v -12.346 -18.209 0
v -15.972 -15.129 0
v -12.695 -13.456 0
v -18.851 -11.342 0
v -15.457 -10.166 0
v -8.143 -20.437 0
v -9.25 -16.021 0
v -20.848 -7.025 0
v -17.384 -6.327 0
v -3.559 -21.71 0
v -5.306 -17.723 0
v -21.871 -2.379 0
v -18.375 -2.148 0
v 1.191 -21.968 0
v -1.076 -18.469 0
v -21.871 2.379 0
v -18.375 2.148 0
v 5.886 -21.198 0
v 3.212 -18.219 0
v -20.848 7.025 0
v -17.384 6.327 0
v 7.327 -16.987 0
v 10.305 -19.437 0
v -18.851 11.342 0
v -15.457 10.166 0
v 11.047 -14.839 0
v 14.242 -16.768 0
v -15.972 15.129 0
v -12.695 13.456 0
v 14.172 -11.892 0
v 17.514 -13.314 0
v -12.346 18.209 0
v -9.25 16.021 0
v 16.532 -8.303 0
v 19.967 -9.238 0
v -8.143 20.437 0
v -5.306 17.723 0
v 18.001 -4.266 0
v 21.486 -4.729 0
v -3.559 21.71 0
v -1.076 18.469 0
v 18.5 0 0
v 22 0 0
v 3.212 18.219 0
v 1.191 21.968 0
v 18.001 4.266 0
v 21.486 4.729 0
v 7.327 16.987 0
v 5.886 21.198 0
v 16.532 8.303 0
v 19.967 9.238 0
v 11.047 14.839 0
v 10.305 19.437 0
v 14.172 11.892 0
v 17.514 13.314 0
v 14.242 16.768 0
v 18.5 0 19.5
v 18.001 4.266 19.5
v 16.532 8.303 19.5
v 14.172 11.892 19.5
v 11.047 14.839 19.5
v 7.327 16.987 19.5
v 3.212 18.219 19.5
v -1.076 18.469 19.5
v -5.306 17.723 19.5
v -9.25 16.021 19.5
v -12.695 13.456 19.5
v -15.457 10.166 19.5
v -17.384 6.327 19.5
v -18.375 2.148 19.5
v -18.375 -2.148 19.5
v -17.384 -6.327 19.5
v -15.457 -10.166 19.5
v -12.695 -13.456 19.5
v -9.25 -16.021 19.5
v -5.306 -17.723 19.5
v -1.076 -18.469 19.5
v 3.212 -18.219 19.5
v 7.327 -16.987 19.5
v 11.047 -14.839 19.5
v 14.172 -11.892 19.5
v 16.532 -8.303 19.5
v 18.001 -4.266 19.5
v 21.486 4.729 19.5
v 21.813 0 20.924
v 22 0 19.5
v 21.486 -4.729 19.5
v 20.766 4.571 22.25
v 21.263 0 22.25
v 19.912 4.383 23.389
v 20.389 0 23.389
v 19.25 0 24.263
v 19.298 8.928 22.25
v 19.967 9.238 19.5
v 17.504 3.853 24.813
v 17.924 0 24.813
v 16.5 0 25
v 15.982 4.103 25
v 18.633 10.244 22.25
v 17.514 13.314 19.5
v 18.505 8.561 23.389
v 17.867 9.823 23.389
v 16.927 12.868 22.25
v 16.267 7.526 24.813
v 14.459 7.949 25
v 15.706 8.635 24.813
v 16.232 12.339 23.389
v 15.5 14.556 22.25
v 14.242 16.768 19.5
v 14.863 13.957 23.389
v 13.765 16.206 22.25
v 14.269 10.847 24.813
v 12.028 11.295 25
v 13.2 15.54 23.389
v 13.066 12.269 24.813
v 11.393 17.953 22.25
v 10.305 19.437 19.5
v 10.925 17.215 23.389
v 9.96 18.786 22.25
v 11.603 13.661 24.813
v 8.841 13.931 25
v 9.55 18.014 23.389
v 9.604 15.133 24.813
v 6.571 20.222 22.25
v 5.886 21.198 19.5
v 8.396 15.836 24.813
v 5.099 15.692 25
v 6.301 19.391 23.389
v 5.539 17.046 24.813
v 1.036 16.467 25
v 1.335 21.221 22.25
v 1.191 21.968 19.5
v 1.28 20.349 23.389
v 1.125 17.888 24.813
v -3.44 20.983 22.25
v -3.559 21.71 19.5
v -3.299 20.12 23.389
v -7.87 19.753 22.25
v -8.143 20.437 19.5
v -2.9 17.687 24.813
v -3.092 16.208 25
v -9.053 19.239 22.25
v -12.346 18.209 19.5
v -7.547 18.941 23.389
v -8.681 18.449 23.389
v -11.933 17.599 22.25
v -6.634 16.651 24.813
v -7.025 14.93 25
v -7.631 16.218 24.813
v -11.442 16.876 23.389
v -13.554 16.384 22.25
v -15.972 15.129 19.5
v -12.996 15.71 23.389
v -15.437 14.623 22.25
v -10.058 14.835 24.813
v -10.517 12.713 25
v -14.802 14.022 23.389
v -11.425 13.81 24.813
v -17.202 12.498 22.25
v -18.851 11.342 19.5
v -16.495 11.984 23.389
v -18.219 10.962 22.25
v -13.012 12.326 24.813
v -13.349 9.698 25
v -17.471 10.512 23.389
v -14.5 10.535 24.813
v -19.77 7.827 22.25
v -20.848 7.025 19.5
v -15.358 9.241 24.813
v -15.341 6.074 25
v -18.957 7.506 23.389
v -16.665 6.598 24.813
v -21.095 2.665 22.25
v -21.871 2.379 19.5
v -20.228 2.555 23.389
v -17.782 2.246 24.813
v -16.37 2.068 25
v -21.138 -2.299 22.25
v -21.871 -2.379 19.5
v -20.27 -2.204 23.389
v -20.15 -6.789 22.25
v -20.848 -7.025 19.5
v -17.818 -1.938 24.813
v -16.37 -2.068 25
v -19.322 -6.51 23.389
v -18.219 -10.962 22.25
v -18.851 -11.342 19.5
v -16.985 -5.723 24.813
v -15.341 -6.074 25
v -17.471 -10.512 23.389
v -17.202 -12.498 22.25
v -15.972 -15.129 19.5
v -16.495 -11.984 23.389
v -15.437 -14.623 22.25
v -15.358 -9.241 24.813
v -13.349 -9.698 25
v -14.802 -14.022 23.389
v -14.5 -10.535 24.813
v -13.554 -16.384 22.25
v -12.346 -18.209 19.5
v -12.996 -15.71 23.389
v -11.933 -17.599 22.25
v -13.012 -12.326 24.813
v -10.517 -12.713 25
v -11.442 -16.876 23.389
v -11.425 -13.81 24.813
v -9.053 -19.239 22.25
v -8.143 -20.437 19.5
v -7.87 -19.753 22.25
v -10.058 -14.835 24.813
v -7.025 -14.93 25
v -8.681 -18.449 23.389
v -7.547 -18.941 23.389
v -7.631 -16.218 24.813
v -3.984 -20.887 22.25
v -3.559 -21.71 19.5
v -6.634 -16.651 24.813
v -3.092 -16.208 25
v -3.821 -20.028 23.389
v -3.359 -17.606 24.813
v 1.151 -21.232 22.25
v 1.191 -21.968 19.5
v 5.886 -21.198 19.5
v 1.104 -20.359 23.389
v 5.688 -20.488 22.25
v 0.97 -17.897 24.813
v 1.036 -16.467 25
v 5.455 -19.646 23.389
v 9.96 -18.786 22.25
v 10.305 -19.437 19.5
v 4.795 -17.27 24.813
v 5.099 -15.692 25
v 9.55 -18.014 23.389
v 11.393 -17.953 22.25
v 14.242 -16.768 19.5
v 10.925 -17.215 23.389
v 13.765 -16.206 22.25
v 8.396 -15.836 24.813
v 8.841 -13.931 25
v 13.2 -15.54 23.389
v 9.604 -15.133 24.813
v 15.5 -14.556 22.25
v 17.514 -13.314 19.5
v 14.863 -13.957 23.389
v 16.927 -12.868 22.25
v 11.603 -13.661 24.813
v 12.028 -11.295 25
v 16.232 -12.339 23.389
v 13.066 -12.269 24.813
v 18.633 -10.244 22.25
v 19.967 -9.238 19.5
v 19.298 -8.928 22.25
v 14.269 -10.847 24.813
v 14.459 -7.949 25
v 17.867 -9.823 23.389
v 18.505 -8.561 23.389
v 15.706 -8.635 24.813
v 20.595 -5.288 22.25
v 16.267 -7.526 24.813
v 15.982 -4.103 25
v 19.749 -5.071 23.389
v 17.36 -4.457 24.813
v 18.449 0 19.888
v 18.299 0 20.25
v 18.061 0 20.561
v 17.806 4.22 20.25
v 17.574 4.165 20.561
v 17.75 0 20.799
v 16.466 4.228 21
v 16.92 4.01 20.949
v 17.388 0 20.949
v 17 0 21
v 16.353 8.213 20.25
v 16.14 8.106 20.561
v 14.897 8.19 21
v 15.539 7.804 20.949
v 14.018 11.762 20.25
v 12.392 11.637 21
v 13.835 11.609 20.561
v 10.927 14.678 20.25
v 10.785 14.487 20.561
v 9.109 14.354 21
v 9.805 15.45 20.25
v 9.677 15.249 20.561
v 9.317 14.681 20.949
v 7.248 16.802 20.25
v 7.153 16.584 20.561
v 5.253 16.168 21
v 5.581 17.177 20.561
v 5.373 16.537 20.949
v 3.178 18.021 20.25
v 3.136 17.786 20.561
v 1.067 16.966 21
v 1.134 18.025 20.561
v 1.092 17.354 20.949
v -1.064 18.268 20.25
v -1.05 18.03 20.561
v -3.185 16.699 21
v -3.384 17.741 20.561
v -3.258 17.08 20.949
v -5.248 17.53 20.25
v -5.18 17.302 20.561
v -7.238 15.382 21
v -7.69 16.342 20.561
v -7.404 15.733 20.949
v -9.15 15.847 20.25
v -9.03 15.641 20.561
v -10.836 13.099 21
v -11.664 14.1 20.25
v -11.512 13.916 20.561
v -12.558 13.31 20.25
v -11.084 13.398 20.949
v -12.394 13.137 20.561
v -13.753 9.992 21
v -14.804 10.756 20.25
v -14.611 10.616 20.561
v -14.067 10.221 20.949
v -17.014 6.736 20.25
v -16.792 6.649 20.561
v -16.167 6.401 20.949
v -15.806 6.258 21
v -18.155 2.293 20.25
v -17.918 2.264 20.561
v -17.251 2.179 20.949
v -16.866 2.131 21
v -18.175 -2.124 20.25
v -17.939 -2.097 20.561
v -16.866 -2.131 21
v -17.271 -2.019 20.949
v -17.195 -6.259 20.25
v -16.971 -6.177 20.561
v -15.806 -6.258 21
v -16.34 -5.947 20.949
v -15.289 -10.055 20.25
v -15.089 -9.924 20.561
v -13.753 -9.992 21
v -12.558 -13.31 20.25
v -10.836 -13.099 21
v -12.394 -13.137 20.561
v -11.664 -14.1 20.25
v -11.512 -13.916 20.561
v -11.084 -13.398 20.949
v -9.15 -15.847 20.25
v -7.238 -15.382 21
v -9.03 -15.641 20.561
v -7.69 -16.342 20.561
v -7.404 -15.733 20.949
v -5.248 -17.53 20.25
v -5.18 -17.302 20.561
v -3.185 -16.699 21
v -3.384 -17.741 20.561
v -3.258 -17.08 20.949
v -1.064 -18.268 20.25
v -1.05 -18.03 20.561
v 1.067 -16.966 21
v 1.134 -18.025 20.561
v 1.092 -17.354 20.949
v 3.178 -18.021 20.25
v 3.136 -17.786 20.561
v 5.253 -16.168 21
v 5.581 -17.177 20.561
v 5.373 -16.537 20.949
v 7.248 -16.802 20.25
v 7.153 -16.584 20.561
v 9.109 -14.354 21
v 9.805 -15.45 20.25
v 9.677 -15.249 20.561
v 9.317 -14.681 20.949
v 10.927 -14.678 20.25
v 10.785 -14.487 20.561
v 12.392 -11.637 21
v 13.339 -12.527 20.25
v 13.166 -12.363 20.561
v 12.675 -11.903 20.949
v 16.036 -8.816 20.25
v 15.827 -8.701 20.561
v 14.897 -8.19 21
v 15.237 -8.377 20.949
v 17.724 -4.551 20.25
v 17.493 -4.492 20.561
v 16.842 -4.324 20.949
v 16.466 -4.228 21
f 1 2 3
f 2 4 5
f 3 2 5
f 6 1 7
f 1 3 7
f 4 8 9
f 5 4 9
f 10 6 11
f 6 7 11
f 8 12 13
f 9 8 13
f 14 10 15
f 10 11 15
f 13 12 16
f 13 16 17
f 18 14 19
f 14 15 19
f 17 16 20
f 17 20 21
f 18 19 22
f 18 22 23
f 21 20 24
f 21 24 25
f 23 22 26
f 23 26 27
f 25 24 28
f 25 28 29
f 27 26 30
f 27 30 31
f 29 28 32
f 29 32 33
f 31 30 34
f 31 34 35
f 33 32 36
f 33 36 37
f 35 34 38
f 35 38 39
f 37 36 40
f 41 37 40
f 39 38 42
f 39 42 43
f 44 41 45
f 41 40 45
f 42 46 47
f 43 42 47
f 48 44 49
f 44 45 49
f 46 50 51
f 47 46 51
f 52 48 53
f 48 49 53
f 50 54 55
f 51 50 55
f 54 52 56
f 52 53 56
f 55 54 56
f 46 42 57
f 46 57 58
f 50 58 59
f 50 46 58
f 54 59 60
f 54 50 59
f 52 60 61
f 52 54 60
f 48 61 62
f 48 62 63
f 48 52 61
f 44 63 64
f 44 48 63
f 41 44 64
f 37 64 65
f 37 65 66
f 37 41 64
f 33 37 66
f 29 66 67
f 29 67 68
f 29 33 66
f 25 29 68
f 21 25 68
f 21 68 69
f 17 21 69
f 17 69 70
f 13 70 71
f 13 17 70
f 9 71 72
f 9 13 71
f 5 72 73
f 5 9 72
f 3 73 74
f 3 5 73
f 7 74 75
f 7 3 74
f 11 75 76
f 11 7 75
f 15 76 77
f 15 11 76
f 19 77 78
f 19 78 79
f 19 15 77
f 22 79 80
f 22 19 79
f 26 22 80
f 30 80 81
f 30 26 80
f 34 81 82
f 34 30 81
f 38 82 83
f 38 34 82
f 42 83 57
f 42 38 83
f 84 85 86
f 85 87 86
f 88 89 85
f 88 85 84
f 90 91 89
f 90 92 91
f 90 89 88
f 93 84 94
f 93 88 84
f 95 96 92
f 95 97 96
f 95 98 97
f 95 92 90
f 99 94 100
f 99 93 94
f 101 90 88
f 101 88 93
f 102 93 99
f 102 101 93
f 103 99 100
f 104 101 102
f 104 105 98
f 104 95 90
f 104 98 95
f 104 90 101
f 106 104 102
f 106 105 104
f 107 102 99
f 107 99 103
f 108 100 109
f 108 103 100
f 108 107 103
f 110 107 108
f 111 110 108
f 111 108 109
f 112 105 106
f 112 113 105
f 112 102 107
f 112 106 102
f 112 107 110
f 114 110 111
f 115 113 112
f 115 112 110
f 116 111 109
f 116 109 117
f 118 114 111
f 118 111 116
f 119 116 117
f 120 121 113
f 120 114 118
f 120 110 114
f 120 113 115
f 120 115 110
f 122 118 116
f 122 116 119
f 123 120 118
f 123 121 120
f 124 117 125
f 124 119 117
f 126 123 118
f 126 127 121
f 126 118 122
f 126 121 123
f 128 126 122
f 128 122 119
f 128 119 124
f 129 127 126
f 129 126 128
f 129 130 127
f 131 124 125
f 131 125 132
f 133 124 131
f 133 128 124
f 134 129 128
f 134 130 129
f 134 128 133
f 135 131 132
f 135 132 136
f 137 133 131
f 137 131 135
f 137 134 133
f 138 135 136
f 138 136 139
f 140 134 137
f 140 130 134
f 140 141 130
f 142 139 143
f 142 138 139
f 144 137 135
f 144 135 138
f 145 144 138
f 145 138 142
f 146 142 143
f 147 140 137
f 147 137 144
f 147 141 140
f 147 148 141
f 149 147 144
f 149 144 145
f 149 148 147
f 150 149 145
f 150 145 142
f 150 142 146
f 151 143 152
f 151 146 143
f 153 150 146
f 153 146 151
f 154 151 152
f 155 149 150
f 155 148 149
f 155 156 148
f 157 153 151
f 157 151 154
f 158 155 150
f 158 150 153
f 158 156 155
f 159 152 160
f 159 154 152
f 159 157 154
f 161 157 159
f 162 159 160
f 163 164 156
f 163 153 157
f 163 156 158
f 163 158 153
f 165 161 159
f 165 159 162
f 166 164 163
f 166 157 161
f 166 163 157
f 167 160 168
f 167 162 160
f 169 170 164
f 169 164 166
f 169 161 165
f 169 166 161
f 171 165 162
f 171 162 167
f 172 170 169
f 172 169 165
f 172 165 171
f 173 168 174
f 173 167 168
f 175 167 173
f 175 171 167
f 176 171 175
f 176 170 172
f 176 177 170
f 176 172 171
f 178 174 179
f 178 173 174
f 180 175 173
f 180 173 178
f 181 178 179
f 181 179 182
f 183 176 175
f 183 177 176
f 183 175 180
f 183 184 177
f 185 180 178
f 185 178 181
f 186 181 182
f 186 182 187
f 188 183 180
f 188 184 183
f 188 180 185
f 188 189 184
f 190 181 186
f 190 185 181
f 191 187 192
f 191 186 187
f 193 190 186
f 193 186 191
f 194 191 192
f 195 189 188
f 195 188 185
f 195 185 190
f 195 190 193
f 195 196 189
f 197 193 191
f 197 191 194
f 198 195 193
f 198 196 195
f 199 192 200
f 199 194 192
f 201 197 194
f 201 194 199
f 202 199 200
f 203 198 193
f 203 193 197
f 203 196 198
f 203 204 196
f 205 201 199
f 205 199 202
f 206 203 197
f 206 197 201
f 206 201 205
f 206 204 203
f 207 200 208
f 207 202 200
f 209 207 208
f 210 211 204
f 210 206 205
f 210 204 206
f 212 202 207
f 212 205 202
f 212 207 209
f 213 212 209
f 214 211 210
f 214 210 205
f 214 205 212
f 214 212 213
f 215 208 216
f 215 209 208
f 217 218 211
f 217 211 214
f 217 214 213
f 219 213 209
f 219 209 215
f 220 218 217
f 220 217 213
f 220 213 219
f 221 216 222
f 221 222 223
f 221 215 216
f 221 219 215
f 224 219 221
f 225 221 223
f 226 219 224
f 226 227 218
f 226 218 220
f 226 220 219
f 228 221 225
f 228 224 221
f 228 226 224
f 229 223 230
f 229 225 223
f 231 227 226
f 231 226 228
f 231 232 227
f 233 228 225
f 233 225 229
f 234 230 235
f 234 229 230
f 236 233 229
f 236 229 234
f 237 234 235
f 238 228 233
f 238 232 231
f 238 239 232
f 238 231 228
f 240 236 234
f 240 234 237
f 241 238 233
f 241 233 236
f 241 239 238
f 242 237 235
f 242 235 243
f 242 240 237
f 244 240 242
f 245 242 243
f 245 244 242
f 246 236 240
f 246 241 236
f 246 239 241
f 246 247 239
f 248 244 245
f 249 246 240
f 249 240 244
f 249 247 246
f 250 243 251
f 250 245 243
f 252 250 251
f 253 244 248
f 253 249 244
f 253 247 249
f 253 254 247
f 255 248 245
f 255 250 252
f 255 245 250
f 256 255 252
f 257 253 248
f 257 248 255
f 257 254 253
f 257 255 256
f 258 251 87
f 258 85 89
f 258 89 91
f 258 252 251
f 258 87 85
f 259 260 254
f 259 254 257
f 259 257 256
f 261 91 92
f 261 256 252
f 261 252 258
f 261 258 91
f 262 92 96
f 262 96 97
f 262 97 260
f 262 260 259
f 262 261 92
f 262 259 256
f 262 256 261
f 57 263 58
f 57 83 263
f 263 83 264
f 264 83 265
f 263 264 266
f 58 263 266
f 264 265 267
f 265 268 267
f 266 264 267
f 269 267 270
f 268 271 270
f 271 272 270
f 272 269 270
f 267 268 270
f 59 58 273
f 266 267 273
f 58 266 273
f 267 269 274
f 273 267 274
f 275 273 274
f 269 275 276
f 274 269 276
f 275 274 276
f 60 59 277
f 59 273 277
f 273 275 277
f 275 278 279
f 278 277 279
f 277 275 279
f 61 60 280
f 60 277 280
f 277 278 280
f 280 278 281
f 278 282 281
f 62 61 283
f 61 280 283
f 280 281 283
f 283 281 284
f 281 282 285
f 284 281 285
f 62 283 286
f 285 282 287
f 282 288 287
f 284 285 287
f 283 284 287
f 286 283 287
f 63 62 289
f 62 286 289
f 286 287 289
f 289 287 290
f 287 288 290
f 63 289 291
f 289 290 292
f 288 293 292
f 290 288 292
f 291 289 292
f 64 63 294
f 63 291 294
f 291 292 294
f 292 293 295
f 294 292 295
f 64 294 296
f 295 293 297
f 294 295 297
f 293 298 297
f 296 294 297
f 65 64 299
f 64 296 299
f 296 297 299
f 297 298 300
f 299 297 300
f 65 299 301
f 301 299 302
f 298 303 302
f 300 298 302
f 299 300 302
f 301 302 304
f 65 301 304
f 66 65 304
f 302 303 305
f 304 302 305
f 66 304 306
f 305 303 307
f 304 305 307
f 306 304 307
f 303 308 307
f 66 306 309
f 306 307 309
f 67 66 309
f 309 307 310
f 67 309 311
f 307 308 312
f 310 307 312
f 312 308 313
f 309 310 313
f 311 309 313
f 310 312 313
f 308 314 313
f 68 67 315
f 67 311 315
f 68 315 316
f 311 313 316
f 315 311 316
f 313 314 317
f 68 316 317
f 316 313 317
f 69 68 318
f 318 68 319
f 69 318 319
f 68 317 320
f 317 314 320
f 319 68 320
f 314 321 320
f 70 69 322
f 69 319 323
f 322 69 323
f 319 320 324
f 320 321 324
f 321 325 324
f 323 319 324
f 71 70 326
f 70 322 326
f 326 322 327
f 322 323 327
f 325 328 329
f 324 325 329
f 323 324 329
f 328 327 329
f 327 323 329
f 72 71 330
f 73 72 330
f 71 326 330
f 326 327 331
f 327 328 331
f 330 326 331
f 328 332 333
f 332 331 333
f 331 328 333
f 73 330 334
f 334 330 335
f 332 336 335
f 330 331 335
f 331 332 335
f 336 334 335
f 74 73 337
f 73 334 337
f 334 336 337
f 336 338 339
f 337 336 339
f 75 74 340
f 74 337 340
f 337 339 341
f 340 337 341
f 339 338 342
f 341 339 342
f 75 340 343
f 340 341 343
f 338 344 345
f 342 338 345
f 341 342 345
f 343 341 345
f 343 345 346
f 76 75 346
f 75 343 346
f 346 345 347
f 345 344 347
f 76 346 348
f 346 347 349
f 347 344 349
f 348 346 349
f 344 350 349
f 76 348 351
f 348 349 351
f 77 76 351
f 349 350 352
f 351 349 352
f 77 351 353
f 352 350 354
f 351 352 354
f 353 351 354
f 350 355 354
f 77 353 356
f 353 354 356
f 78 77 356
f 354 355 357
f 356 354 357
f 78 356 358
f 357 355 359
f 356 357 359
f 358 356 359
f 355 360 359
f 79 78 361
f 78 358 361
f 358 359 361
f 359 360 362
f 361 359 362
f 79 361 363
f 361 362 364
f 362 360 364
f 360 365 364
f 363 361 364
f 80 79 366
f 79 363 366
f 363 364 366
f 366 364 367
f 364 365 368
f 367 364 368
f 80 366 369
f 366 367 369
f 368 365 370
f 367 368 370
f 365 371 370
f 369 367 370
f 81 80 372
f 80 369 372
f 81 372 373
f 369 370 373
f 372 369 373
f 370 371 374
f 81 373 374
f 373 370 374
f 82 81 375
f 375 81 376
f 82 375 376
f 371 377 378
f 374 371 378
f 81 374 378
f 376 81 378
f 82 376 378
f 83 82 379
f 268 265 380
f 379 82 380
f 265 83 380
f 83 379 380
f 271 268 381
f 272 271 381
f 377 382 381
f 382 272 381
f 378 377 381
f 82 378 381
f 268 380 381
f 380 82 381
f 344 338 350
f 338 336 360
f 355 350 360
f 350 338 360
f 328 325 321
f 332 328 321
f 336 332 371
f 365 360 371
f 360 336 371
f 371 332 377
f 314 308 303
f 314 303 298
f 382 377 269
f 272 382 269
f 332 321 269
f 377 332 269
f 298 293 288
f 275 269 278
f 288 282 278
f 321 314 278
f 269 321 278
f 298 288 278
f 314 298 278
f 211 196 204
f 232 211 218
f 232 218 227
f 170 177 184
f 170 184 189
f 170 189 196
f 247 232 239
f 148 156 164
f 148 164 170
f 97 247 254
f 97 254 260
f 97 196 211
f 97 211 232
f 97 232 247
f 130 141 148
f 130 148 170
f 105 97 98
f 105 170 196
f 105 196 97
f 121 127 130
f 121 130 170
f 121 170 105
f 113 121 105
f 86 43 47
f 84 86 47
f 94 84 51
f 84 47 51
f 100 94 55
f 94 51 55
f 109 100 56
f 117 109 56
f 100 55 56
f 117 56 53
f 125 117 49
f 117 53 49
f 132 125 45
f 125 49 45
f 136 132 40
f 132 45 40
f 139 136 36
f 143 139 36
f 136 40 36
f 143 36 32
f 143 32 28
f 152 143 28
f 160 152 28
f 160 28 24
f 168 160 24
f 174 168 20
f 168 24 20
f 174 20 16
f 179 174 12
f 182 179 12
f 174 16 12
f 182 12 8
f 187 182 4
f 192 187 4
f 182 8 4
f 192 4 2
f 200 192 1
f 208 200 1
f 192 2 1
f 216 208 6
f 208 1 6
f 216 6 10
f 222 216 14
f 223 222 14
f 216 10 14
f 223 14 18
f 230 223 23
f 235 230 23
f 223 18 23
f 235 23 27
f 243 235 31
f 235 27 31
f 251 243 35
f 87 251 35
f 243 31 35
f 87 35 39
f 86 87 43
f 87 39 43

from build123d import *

# Parameters (mm, degrees)
F0_R     = 22
F1_DEPTH = 25
F2_R     = 5.5
F3_R     = 18.5
F4_DEPTH = 21
F5_R     = 1.5


with BuildPart() as f1:
    # F0 (on Top) → F1 (new body)
    with BuildSketch(Plane.XY):
        Circle(F0_R)
    extrude(amount=F1_DEPTH)

    # F2
    f2_edges = [f1.edges().sort_by_distance(p)[0] for p in [
        (-22, 0, 25),
    ]]
    fillet(f2_edges, radius=F2_R)

    # F3 (on Top) → F4 (cut)
    with BuildSketch(Plane.XY):
        Circle(F3_R)
    extrude(amount=F4_DEPTH, mode=Mode.SUBTRACT)

    # F5
    f5_edges = [f1.edges().sort_by_distance(p)[0] for p in [
        (-18.5, 0, 21),
    ]]
    fillet(f5_edges, radius=F5_R)


solid = f1.part
